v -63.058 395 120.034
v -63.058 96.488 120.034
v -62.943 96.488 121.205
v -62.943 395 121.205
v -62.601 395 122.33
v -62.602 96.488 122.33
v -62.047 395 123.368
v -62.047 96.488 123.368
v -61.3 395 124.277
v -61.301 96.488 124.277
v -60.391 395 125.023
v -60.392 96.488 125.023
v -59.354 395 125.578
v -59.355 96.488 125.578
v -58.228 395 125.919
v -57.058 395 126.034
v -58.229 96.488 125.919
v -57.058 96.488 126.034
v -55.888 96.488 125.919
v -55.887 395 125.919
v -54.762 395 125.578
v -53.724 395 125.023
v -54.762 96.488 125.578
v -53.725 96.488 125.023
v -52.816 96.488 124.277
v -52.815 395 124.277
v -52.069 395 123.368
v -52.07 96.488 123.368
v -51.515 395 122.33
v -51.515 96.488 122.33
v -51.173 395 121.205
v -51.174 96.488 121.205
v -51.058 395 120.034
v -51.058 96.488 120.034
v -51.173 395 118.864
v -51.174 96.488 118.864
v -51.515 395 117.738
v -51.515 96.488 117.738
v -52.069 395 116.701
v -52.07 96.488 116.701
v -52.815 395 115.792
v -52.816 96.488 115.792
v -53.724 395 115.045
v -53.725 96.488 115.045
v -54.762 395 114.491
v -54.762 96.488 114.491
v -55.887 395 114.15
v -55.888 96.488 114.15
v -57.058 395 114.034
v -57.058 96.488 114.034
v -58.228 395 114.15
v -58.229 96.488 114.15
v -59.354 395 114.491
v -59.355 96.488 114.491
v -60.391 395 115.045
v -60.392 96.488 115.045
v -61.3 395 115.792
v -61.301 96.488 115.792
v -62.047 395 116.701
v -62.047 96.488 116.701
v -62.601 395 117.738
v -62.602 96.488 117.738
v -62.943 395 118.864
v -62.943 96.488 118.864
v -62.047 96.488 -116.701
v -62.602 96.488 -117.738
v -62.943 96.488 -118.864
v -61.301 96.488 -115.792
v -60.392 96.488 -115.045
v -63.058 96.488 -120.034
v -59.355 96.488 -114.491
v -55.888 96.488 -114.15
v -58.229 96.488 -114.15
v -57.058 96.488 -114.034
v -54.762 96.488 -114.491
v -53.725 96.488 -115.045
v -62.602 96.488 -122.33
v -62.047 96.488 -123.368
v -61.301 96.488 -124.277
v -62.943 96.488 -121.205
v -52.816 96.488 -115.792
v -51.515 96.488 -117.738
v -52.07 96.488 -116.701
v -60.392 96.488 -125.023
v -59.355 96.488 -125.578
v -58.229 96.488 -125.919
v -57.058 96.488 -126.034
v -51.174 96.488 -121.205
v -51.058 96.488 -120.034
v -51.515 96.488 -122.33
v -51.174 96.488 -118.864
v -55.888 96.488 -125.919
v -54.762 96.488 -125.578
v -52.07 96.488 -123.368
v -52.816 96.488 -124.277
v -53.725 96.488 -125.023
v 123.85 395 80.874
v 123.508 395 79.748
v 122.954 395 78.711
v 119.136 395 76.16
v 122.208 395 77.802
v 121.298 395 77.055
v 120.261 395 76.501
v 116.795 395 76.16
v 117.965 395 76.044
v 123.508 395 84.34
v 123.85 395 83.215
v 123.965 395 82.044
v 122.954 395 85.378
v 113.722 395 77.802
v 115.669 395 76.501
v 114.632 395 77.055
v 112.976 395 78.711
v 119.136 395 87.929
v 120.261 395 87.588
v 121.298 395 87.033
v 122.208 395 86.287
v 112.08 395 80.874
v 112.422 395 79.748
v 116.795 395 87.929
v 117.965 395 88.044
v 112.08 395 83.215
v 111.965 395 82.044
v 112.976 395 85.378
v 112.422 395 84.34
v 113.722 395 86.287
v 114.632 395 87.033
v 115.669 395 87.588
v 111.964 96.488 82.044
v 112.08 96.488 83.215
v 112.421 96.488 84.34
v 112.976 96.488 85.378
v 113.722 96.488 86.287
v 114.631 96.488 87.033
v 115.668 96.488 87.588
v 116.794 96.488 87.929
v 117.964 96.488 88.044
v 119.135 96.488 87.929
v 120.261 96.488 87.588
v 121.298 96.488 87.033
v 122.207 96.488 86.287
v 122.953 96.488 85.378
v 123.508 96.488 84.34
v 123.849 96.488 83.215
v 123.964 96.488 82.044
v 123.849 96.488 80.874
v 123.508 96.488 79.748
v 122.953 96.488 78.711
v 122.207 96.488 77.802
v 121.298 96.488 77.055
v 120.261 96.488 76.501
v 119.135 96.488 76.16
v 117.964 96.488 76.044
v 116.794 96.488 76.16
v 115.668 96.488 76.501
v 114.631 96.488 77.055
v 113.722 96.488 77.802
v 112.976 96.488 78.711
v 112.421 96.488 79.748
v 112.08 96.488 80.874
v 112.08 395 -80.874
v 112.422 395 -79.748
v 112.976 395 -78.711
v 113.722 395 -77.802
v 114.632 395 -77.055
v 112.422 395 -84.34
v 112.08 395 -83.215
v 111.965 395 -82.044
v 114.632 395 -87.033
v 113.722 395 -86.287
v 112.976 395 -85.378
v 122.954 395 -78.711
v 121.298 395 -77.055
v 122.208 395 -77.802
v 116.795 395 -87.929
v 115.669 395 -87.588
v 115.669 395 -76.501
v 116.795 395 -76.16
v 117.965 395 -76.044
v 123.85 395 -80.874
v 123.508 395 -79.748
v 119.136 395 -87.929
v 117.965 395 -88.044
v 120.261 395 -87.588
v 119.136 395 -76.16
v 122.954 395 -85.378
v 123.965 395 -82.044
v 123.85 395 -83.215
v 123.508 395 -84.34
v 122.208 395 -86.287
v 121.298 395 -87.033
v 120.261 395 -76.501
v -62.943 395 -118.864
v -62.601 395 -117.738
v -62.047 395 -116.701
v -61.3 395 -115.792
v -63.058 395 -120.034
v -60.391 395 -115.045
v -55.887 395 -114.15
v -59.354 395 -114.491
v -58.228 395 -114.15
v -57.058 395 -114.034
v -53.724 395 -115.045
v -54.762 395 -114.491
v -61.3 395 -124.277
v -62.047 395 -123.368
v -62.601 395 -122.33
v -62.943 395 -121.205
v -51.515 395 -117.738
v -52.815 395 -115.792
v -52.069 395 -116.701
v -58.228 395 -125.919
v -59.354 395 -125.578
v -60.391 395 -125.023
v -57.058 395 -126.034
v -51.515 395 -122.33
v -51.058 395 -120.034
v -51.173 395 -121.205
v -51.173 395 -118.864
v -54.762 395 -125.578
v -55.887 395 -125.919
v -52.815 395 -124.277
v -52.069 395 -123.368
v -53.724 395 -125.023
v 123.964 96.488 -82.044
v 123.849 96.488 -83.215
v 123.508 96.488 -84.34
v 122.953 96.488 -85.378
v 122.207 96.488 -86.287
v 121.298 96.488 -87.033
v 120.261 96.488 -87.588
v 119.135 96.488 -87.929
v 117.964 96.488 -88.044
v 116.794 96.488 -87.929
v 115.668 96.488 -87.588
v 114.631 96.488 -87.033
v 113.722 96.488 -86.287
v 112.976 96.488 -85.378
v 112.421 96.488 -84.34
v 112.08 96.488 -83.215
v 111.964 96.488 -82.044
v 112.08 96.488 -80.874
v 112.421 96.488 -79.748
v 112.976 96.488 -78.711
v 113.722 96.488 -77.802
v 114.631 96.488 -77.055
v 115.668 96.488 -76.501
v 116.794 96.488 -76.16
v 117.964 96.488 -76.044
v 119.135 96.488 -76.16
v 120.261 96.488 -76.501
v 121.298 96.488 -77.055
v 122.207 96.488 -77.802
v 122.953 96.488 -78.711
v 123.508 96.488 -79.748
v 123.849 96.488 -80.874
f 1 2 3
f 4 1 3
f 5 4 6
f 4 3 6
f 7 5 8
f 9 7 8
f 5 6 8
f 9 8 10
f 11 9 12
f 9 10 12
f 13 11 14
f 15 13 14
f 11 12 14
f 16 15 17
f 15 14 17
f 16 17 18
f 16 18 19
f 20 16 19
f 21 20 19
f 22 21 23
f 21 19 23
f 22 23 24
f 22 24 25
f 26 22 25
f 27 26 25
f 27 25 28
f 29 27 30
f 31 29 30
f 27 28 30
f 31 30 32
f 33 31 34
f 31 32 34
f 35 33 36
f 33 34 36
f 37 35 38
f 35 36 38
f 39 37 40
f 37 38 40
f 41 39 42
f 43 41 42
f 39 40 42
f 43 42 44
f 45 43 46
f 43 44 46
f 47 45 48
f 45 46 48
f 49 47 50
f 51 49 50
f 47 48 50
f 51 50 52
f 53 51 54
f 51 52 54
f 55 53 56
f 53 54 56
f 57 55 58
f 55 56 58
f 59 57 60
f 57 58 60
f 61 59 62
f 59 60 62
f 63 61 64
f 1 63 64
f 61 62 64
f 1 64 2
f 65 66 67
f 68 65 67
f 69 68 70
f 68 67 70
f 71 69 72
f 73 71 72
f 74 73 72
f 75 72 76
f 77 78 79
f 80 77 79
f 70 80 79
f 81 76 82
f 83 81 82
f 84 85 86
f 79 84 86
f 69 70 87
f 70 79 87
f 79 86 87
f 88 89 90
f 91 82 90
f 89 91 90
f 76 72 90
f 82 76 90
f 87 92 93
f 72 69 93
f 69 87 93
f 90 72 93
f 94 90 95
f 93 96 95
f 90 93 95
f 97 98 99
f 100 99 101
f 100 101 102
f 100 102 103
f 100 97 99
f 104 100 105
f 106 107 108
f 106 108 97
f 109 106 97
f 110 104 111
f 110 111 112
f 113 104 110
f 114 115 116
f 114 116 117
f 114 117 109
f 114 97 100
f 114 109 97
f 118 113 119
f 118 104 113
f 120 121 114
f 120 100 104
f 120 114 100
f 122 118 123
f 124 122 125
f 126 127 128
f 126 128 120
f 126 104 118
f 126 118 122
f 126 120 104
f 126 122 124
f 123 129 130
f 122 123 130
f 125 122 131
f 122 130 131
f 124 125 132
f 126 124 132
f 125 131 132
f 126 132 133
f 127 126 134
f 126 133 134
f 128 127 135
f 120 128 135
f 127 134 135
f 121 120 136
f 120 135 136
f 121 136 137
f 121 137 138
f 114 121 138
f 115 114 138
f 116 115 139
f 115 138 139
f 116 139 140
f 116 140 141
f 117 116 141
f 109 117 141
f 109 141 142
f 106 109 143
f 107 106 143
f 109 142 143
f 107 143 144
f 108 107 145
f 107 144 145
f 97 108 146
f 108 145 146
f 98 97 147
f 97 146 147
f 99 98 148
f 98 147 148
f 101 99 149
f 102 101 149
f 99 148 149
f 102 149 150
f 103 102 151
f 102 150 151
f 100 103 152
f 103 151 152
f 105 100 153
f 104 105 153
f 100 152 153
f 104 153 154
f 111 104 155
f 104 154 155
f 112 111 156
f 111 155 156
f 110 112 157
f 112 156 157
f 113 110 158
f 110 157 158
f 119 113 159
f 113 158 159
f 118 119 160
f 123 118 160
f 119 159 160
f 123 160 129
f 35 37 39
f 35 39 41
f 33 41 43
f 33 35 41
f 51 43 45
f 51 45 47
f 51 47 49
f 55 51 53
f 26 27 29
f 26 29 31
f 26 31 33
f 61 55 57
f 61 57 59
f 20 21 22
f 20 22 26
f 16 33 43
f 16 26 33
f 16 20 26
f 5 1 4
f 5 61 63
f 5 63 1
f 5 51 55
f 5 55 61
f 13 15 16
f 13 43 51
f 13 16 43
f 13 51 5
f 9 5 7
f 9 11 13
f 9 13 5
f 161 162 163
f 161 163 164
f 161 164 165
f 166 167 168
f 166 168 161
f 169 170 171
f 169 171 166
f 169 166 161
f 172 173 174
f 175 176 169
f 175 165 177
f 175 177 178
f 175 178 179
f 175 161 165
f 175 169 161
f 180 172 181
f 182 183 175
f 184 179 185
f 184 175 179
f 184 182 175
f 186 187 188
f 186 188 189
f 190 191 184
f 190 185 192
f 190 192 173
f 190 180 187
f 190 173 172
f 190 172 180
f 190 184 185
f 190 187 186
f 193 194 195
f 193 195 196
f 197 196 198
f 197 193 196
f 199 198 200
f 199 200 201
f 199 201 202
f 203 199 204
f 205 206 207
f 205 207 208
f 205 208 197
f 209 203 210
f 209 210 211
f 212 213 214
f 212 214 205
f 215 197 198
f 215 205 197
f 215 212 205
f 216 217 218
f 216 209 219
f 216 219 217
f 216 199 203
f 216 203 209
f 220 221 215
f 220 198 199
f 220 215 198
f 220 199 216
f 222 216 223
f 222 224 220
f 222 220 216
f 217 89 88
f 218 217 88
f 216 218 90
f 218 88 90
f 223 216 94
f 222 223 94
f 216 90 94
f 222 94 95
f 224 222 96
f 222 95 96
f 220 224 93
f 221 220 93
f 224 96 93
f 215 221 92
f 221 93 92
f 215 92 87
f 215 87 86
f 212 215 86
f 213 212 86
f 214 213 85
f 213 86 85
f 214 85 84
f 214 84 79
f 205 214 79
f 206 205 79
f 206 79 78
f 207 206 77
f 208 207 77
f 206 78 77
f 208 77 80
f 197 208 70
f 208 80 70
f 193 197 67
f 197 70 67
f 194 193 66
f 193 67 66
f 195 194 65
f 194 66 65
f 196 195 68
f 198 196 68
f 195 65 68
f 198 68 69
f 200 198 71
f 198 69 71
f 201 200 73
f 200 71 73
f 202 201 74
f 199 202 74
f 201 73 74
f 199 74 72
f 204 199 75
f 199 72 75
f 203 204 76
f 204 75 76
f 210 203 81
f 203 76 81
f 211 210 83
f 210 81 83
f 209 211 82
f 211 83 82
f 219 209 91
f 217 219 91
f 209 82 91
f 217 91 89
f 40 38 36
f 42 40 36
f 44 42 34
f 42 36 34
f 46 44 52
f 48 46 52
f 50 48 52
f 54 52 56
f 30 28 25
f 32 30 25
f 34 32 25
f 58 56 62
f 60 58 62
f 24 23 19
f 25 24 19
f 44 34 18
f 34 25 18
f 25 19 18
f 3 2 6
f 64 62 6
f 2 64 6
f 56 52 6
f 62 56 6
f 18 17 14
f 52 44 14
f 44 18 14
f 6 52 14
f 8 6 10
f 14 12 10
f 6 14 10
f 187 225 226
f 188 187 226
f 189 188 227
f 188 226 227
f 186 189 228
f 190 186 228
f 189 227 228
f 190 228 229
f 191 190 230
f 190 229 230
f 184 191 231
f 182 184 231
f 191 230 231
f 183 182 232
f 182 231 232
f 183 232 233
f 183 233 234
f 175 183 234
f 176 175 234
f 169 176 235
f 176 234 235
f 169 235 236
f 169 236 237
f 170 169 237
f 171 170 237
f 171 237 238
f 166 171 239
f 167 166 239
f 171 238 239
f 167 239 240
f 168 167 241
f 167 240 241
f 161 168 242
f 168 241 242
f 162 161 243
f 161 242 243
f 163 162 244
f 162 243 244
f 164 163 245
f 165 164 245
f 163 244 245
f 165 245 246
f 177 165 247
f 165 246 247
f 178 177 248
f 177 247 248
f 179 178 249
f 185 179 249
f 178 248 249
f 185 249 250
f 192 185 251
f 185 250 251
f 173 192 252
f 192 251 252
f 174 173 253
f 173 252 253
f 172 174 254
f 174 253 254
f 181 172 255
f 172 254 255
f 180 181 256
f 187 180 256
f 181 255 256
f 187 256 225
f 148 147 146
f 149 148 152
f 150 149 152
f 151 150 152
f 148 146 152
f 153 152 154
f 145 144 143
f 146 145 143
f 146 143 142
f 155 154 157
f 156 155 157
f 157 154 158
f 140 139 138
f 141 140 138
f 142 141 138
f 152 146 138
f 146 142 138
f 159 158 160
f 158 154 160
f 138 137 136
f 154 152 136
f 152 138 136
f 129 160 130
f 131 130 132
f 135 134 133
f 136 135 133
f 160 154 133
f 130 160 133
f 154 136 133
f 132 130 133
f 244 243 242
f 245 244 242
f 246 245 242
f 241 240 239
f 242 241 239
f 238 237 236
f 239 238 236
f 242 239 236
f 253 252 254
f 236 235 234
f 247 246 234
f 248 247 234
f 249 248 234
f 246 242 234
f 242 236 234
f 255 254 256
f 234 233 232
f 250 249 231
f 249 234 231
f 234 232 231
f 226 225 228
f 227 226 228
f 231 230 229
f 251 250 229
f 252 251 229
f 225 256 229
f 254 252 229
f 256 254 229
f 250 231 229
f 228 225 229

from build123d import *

# Parameters (mm, degrees)
SKETCH2_R             = 6
BOSS_EXTRUDE2_DEPTH   = 298.511867092
BOSS_EXTRUDE2_2_DEPTH = 298.511867092
BOSS_EXTRUDE2_3_DEPTH = 298.511867092
BOSS_EXTRUDE2_4_DEPTH = 298.511867092


with BuildPart() as part:
    # Sketch2 → Boss-Extrude2 (new body)
    with BuildSketch(Plane(origin=(0.000194926, 96.488005517, 0), x_dir=(0.9999999999979595, -2.0202115698660515e-06, 0), z_dir=(2.0202115698660515e-06, 0.9999999999979595, 0))):
        with Locations(Location((-57.058628867, -120.034242926, 0), (0, 0, 180.000000006))):
            Circle(SKETCH2_R)
    extrude(amount=BOSS_EXTRUDE2_DEPTH)


with BuildPart() as body_2:
    # Sketch2 → Boss-Extrude2 2 (new body)
    with BuildSketch(Plane(origin=(0.000194926, 96.488005517, 0), x_dir=(0.9999999999979595, -2.0202115698660515e-06, 0), z_dir=(2.0202115698660515e-06, 0.9999999999979595, 0))):
        with Locations(Location((117.964276061, -82.044262058, 0), (0, 0, 180.000000006))):
            Circle(SKETCH2_R)
    extrude(amount=BOSS_EXTRUDE2_2_DEPTH)


with BuildPart() as body_3:
    # Sketch2 → Boss-Extrude2 3 (new body)
    with BuildSketch(Plane(origin=(0.000194926, 96.488005517, 0), x_dir=(0.9999999999979595, -2.0202115698660515e-06, 0), z_dir=(2.0202115698660515e-06, 0.9999999999979595, 0))):
        with Locations((117.964276061, 82.044262058)):
            Circle(SKETCH2_R)
    extrude(amount=BOSS_EXTRUDE2_3_DEPTH)


with BuildPart() as body_4:
    # Sketch2 → Boss-Extrude2 4 (new body)
    with BuildSketch(Plane(origin=(0.000194926, 96.488005517, 0), x_dir=(0.9999999999979595, -2.0202115698660515e-06, 0), z_dir=(2.0202115698660515e-06, 0.9999999999979595, 0))):
        with Locations((-57.058628867, 120.034242926)):
            Circle(SKETCH2_R)
    extrude(amount=BOSS_EXTRUDE2_4_DEPTH)


solid = Compound([part.part, body_2.part, body_3.part, body_4.part])
